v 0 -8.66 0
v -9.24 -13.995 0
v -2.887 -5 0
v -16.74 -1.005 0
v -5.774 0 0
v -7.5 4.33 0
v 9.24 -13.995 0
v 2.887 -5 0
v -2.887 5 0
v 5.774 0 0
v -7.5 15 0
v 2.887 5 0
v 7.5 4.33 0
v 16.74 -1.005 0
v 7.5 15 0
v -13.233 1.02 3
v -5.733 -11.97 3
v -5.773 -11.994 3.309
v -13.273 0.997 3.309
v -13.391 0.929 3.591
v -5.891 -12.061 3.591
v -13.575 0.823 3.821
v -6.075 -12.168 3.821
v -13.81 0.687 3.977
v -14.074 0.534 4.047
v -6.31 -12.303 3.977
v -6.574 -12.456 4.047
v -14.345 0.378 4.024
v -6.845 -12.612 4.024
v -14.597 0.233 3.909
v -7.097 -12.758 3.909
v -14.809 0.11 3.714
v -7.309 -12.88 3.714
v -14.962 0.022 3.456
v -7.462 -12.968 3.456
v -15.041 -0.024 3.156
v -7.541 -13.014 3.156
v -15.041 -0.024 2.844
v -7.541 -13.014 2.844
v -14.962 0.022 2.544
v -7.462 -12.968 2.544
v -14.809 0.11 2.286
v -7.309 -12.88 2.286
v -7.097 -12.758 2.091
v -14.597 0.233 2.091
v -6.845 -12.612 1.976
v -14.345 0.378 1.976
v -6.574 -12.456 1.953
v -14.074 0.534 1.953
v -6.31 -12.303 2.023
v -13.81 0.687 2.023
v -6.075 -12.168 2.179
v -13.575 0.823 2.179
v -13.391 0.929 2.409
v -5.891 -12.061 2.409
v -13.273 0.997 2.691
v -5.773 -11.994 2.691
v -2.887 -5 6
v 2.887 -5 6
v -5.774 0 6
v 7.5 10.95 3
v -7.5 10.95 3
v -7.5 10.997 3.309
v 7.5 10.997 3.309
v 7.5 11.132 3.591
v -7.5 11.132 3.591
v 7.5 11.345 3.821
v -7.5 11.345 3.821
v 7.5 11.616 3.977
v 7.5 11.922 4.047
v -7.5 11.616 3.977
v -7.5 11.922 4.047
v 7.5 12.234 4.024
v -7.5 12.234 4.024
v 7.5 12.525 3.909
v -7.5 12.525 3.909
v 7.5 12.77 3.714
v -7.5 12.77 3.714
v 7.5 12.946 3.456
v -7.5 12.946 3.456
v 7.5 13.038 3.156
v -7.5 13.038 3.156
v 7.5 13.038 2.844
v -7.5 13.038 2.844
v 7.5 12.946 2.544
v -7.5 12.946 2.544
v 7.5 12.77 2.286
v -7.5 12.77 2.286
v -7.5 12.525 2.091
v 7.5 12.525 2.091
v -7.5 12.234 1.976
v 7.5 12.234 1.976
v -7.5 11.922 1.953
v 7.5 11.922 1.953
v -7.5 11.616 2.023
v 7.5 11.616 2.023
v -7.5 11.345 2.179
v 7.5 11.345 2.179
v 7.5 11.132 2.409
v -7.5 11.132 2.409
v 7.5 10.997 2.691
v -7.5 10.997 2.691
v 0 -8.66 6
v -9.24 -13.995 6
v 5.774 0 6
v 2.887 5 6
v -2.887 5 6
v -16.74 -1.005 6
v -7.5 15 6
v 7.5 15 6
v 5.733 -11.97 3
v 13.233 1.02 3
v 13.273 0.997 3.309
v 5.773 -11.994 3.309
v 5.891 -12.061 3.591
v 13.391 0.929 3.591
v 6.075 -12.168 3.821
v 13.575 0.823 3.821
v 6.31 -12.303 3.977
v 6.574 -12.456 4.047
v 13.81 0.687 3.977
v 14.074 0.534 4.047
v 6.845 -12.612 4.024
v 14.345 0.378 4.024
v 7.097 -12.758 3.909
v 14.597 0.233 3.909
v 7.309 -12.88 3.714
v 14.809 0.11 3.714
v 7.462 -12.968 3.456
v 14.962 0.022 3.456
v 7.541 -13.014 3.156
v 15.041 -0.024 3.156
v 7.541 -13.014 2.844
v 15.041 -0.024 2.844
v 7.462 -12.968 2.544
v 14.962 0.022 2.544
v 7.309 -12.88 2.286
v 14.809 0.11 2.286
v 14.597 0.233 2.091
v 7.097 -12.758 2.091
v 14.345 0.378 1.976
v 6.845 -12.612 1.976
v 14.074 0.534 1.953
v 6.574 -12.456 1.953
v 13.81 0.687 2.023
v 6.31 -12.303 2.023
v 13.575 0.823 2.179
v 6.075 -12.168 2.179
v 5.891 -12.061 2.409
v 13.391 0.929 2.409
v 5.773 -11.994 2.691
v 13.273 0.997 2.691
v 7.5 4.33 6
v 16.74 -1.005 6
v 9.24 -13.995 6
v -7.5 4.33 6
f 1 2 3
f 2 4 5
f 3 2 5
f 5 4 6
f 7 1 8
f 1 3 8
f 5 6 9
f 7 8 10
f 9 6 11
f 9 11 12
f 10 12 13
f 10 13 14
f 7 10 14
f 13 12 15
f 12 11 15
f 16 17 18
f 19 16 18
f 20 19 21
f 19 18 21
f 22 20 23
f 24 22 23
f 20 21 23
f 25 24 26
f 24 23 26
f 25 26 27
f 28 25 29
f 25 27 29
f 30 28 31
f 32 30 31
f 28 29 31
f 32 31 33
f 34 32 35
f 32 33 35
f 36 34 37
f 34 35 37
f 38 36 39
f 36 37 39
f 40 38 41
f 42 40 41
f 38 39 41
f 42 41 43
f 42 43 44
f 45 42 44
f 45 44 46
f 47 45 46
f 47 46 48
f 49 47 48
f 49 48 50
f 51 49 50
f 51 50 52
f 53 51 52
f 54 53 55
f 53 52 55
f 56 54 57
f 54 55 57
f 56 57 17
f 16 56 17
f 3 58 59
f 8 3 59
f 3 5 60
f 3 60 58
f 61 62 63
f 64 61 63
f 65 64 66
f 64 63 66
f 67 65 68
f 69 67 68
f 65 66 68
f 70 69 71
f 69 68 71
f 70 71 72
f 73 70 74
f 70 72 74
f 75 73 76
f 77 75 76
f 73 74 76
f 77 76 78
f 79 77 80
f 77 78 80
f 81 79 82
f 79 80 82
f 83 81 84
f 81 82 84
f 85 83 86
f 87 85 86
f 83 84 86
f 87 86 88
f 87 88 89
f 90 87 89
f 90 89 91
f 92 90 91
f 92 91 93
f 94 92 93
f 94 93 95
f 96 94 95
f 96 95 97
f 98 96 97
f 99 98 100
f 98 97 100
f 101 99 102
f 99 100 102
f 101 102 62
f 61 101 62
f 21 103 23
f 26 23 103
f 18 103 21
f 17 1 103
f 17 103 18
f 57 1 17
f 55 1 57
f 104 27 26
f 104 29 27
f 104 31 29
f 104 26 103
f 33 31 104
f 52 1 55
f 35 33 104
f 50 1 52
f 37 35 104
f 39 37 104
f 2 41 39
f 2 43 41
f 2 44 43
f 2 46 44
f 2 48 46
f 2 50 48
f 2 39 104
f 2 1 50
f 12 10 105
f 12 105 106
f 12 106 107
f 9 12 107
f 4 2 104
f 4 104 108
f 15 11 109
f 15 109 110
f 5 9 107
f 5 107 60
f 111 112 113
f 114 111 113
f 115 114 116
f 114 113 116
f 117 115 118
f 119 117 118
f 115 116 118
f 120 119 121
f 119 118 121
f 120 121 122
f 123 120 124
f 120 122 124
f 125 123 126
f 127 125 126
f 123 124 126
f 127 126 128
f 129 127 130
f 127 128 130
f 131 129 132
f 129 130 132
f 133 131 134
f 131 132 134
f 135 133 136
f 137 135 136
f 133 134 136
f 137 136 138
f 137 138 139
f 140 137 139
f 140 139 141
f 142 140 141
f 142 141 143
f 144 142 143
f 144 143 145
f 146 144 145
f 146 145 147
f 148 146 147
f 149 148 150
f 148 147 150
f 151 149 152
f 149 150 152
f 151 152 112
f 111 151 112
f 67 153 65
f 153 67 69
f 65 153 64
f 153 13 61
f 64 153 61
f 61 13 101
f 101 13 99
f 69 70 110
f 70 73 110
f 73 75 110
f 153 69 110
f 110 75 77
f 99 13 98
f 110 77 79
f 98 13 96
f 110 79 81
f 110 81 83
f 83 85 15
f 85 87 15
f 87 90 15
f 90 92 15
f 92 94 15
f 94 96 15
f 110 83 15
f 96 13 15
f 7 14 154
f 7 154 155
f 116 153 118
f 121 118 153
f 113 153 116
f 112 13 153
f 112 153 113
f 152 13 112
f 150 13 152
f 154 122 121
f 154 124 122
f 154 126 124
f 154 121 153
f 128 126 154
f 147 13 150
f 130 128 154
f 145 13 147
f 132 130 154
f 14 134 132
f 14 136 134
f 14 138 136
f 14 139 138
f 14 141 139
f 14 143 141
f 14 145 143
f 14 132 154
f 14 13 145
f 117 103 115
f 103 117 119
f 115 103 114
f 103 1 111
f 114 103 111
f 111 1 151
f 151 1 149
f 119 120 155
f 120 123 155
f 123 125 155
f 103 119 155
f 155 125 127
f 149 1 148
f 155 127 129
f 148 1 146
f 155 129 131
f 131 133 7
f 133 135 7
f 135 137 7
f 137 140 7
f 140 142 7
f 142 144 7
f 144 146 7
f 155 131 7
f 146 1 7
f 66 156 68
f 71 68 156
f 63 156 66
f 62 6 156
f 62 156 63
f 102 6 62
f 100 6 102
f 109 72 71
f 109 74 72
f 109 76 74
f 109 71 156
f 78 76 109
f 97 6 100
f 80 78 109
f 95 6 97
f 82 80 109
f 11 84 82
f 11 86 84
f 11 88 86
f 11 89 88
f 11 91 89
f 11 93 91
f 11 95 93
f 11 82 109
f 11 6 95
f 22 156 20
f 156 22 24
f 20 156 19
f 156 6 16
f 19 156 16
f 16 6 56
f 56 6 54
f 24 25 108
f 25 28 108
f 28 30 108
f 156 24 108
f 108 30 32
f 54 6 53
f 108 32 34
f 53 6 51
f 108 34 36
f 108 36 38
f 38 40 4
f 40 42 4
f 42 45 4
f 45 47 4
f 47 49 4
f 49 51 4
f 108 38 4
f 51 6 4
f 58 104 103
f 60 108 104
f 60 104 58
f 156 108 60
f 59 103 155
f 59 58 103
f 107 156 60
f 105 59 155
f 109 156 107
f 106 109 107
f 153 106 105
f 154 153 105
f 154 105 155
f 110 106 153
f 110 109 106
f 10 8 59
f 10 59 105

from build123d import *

# Parameters (mm, degrees)
F0_W     = 15
F0_H     = 15
F1_DEPTH = 6
F2_R     = 1.05
F3_DEPTH = 15
F5_COUNT = 3
F7_DEPTH = 6


with BuildPart() as f1:
    # F0 (on Top) → F1 (new body)
    with BuildSketch(Plane.XY):
        with Locations((0, 7.5)):
            Rectangle(F0_W, F0_H)
    extrude(amount=F1_DEPTH)

    # F2 (on face) → F3 (cut, through all)
    with BuildSketch(Plane(origin=(-7.5, 0, 0), x_dir=(0, -1, 0), z_dir=(-1, 0, 0))):
        with Locations((-12, 3)):
            Circle(F2_R)
    extrude(amount=-F3_DEPTH, mode=Mode.SUBTRACT)

    # F5: F1 ×3 about axis
    f5_axis = Axis((0, 0, -1.369192), (0, 0, -1))


with BuildPart() as f1_1:
    add(f1.part)
    for i in range(1, F5_COUNT):
        add(f1.part.rotate(f5_axis, i * 360 / F5_COUNT))

    # F6 (on Top) → F7 (cut, through all)
    with BuildSketch(Plane.XY):
        Polygon((2.886751, 5), (-2.886751, 5), (-5.773503, 0), (-2.886751, -5), (2.886751, -5), (5.773503, 0), align=None)
    extrude(amount=F7_DEPTH, mode=Mode.SUBTRACT)


solid = f1_1.part
